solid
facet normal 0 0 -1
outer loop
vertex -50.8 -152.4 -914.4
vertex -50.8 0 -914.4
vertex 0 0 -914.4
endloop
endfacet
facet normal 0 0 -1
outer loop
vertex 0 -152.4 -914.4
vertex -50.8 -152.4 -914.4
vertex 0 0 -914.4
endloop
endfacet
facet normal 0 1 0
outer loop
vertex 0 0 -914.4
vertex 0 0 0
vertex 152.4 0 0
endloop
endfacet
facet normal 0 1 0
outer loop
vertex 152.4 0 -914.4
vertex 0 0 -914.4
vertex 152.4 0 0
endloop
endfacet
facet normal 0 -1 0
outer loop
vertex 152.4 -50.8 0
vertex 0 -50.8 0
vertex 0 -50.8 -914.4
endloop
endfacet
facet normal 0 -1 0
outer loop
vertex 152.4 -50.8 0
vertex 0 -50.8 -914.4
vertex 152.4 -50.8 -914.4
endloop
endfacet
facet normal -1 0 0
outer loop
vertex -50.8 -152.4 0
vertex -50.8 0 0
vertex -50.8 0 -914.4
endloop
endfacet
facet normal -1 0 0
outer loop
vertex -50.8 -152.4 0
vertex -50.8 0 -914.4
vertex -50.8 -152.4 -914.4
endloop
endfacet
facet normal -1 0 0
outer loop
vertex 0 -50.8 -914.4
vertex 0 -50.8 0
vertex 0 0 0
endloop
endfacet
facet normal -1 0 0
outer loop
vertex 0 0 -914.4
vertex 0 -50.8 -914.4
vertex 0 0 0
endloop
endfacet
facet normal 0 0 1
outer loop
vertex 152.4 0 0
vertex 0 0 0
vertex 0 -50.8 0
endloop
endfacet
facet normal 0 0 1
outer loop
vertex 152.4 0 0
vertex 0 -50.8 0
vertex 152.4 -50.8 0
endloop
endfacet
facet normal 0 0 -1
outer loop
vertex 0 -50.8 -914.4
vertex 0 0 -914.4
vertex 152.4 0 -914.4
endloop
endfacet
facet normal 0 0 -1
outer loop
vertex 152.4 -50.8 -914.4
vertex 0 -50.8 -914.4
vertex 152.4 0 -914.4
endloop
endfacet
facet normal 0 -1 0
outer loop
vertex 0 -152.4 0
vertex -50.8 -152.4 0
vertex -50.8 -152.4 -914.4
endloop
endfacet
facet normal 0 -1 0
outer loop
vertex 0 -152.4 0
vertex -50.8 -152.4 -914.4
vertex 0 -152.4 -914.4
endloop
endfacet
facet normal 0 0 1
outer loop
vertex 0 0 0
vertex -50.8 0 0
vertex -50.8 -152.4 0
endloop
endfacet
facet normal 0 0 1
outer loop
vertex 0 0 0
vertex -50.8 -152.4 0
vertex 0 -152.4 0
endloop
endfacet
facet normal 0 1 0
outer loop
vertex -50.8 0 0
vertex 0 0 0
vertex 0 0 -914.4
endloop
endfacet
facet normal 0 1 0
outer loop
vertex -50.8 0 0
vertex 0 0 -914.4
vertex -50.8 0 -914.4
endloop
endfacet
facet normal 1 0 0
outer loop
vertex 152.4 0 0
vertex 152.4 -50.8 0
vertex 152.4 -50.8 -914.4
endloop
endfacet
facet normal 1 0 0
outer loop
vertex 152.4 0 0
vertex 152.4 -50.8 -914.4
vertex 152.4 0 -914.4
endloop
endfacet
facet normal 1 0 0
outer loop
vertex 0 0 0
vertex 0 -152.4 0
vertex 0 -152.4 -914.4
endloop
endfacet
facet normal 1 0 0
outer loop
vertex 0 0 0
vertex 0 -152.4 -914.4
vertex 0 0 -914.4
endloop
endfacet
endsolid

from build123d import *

# Parameters (mm, degrees)
F0_W     = 152.4
F0_H     = 50.8
F1_DEPTH = 914.4
F2_DEPTH = 914.4


with BuildPart() as f1:
    # F0 (on Top) → F1 (new body)
    with BuildSketch(Plane.XY):
        with Locations((76.2, -25.4)):
            Rectangle(F0_W, F0_H)
    extrude(amount=-F1_DEPTH)


with BuildPart() as f2:
    # F0 (on Top) → F2 (new body)
    with BuildSketch(Plane.XY):
        Polygon((0, -50.8), (0, 0), (-50.8, 0), (-50.8, -152.4), (0, -152.4), align=None)
    extrude(amount=-F2_DEPTH)


solid = Compound([f1.part, f2.part])
